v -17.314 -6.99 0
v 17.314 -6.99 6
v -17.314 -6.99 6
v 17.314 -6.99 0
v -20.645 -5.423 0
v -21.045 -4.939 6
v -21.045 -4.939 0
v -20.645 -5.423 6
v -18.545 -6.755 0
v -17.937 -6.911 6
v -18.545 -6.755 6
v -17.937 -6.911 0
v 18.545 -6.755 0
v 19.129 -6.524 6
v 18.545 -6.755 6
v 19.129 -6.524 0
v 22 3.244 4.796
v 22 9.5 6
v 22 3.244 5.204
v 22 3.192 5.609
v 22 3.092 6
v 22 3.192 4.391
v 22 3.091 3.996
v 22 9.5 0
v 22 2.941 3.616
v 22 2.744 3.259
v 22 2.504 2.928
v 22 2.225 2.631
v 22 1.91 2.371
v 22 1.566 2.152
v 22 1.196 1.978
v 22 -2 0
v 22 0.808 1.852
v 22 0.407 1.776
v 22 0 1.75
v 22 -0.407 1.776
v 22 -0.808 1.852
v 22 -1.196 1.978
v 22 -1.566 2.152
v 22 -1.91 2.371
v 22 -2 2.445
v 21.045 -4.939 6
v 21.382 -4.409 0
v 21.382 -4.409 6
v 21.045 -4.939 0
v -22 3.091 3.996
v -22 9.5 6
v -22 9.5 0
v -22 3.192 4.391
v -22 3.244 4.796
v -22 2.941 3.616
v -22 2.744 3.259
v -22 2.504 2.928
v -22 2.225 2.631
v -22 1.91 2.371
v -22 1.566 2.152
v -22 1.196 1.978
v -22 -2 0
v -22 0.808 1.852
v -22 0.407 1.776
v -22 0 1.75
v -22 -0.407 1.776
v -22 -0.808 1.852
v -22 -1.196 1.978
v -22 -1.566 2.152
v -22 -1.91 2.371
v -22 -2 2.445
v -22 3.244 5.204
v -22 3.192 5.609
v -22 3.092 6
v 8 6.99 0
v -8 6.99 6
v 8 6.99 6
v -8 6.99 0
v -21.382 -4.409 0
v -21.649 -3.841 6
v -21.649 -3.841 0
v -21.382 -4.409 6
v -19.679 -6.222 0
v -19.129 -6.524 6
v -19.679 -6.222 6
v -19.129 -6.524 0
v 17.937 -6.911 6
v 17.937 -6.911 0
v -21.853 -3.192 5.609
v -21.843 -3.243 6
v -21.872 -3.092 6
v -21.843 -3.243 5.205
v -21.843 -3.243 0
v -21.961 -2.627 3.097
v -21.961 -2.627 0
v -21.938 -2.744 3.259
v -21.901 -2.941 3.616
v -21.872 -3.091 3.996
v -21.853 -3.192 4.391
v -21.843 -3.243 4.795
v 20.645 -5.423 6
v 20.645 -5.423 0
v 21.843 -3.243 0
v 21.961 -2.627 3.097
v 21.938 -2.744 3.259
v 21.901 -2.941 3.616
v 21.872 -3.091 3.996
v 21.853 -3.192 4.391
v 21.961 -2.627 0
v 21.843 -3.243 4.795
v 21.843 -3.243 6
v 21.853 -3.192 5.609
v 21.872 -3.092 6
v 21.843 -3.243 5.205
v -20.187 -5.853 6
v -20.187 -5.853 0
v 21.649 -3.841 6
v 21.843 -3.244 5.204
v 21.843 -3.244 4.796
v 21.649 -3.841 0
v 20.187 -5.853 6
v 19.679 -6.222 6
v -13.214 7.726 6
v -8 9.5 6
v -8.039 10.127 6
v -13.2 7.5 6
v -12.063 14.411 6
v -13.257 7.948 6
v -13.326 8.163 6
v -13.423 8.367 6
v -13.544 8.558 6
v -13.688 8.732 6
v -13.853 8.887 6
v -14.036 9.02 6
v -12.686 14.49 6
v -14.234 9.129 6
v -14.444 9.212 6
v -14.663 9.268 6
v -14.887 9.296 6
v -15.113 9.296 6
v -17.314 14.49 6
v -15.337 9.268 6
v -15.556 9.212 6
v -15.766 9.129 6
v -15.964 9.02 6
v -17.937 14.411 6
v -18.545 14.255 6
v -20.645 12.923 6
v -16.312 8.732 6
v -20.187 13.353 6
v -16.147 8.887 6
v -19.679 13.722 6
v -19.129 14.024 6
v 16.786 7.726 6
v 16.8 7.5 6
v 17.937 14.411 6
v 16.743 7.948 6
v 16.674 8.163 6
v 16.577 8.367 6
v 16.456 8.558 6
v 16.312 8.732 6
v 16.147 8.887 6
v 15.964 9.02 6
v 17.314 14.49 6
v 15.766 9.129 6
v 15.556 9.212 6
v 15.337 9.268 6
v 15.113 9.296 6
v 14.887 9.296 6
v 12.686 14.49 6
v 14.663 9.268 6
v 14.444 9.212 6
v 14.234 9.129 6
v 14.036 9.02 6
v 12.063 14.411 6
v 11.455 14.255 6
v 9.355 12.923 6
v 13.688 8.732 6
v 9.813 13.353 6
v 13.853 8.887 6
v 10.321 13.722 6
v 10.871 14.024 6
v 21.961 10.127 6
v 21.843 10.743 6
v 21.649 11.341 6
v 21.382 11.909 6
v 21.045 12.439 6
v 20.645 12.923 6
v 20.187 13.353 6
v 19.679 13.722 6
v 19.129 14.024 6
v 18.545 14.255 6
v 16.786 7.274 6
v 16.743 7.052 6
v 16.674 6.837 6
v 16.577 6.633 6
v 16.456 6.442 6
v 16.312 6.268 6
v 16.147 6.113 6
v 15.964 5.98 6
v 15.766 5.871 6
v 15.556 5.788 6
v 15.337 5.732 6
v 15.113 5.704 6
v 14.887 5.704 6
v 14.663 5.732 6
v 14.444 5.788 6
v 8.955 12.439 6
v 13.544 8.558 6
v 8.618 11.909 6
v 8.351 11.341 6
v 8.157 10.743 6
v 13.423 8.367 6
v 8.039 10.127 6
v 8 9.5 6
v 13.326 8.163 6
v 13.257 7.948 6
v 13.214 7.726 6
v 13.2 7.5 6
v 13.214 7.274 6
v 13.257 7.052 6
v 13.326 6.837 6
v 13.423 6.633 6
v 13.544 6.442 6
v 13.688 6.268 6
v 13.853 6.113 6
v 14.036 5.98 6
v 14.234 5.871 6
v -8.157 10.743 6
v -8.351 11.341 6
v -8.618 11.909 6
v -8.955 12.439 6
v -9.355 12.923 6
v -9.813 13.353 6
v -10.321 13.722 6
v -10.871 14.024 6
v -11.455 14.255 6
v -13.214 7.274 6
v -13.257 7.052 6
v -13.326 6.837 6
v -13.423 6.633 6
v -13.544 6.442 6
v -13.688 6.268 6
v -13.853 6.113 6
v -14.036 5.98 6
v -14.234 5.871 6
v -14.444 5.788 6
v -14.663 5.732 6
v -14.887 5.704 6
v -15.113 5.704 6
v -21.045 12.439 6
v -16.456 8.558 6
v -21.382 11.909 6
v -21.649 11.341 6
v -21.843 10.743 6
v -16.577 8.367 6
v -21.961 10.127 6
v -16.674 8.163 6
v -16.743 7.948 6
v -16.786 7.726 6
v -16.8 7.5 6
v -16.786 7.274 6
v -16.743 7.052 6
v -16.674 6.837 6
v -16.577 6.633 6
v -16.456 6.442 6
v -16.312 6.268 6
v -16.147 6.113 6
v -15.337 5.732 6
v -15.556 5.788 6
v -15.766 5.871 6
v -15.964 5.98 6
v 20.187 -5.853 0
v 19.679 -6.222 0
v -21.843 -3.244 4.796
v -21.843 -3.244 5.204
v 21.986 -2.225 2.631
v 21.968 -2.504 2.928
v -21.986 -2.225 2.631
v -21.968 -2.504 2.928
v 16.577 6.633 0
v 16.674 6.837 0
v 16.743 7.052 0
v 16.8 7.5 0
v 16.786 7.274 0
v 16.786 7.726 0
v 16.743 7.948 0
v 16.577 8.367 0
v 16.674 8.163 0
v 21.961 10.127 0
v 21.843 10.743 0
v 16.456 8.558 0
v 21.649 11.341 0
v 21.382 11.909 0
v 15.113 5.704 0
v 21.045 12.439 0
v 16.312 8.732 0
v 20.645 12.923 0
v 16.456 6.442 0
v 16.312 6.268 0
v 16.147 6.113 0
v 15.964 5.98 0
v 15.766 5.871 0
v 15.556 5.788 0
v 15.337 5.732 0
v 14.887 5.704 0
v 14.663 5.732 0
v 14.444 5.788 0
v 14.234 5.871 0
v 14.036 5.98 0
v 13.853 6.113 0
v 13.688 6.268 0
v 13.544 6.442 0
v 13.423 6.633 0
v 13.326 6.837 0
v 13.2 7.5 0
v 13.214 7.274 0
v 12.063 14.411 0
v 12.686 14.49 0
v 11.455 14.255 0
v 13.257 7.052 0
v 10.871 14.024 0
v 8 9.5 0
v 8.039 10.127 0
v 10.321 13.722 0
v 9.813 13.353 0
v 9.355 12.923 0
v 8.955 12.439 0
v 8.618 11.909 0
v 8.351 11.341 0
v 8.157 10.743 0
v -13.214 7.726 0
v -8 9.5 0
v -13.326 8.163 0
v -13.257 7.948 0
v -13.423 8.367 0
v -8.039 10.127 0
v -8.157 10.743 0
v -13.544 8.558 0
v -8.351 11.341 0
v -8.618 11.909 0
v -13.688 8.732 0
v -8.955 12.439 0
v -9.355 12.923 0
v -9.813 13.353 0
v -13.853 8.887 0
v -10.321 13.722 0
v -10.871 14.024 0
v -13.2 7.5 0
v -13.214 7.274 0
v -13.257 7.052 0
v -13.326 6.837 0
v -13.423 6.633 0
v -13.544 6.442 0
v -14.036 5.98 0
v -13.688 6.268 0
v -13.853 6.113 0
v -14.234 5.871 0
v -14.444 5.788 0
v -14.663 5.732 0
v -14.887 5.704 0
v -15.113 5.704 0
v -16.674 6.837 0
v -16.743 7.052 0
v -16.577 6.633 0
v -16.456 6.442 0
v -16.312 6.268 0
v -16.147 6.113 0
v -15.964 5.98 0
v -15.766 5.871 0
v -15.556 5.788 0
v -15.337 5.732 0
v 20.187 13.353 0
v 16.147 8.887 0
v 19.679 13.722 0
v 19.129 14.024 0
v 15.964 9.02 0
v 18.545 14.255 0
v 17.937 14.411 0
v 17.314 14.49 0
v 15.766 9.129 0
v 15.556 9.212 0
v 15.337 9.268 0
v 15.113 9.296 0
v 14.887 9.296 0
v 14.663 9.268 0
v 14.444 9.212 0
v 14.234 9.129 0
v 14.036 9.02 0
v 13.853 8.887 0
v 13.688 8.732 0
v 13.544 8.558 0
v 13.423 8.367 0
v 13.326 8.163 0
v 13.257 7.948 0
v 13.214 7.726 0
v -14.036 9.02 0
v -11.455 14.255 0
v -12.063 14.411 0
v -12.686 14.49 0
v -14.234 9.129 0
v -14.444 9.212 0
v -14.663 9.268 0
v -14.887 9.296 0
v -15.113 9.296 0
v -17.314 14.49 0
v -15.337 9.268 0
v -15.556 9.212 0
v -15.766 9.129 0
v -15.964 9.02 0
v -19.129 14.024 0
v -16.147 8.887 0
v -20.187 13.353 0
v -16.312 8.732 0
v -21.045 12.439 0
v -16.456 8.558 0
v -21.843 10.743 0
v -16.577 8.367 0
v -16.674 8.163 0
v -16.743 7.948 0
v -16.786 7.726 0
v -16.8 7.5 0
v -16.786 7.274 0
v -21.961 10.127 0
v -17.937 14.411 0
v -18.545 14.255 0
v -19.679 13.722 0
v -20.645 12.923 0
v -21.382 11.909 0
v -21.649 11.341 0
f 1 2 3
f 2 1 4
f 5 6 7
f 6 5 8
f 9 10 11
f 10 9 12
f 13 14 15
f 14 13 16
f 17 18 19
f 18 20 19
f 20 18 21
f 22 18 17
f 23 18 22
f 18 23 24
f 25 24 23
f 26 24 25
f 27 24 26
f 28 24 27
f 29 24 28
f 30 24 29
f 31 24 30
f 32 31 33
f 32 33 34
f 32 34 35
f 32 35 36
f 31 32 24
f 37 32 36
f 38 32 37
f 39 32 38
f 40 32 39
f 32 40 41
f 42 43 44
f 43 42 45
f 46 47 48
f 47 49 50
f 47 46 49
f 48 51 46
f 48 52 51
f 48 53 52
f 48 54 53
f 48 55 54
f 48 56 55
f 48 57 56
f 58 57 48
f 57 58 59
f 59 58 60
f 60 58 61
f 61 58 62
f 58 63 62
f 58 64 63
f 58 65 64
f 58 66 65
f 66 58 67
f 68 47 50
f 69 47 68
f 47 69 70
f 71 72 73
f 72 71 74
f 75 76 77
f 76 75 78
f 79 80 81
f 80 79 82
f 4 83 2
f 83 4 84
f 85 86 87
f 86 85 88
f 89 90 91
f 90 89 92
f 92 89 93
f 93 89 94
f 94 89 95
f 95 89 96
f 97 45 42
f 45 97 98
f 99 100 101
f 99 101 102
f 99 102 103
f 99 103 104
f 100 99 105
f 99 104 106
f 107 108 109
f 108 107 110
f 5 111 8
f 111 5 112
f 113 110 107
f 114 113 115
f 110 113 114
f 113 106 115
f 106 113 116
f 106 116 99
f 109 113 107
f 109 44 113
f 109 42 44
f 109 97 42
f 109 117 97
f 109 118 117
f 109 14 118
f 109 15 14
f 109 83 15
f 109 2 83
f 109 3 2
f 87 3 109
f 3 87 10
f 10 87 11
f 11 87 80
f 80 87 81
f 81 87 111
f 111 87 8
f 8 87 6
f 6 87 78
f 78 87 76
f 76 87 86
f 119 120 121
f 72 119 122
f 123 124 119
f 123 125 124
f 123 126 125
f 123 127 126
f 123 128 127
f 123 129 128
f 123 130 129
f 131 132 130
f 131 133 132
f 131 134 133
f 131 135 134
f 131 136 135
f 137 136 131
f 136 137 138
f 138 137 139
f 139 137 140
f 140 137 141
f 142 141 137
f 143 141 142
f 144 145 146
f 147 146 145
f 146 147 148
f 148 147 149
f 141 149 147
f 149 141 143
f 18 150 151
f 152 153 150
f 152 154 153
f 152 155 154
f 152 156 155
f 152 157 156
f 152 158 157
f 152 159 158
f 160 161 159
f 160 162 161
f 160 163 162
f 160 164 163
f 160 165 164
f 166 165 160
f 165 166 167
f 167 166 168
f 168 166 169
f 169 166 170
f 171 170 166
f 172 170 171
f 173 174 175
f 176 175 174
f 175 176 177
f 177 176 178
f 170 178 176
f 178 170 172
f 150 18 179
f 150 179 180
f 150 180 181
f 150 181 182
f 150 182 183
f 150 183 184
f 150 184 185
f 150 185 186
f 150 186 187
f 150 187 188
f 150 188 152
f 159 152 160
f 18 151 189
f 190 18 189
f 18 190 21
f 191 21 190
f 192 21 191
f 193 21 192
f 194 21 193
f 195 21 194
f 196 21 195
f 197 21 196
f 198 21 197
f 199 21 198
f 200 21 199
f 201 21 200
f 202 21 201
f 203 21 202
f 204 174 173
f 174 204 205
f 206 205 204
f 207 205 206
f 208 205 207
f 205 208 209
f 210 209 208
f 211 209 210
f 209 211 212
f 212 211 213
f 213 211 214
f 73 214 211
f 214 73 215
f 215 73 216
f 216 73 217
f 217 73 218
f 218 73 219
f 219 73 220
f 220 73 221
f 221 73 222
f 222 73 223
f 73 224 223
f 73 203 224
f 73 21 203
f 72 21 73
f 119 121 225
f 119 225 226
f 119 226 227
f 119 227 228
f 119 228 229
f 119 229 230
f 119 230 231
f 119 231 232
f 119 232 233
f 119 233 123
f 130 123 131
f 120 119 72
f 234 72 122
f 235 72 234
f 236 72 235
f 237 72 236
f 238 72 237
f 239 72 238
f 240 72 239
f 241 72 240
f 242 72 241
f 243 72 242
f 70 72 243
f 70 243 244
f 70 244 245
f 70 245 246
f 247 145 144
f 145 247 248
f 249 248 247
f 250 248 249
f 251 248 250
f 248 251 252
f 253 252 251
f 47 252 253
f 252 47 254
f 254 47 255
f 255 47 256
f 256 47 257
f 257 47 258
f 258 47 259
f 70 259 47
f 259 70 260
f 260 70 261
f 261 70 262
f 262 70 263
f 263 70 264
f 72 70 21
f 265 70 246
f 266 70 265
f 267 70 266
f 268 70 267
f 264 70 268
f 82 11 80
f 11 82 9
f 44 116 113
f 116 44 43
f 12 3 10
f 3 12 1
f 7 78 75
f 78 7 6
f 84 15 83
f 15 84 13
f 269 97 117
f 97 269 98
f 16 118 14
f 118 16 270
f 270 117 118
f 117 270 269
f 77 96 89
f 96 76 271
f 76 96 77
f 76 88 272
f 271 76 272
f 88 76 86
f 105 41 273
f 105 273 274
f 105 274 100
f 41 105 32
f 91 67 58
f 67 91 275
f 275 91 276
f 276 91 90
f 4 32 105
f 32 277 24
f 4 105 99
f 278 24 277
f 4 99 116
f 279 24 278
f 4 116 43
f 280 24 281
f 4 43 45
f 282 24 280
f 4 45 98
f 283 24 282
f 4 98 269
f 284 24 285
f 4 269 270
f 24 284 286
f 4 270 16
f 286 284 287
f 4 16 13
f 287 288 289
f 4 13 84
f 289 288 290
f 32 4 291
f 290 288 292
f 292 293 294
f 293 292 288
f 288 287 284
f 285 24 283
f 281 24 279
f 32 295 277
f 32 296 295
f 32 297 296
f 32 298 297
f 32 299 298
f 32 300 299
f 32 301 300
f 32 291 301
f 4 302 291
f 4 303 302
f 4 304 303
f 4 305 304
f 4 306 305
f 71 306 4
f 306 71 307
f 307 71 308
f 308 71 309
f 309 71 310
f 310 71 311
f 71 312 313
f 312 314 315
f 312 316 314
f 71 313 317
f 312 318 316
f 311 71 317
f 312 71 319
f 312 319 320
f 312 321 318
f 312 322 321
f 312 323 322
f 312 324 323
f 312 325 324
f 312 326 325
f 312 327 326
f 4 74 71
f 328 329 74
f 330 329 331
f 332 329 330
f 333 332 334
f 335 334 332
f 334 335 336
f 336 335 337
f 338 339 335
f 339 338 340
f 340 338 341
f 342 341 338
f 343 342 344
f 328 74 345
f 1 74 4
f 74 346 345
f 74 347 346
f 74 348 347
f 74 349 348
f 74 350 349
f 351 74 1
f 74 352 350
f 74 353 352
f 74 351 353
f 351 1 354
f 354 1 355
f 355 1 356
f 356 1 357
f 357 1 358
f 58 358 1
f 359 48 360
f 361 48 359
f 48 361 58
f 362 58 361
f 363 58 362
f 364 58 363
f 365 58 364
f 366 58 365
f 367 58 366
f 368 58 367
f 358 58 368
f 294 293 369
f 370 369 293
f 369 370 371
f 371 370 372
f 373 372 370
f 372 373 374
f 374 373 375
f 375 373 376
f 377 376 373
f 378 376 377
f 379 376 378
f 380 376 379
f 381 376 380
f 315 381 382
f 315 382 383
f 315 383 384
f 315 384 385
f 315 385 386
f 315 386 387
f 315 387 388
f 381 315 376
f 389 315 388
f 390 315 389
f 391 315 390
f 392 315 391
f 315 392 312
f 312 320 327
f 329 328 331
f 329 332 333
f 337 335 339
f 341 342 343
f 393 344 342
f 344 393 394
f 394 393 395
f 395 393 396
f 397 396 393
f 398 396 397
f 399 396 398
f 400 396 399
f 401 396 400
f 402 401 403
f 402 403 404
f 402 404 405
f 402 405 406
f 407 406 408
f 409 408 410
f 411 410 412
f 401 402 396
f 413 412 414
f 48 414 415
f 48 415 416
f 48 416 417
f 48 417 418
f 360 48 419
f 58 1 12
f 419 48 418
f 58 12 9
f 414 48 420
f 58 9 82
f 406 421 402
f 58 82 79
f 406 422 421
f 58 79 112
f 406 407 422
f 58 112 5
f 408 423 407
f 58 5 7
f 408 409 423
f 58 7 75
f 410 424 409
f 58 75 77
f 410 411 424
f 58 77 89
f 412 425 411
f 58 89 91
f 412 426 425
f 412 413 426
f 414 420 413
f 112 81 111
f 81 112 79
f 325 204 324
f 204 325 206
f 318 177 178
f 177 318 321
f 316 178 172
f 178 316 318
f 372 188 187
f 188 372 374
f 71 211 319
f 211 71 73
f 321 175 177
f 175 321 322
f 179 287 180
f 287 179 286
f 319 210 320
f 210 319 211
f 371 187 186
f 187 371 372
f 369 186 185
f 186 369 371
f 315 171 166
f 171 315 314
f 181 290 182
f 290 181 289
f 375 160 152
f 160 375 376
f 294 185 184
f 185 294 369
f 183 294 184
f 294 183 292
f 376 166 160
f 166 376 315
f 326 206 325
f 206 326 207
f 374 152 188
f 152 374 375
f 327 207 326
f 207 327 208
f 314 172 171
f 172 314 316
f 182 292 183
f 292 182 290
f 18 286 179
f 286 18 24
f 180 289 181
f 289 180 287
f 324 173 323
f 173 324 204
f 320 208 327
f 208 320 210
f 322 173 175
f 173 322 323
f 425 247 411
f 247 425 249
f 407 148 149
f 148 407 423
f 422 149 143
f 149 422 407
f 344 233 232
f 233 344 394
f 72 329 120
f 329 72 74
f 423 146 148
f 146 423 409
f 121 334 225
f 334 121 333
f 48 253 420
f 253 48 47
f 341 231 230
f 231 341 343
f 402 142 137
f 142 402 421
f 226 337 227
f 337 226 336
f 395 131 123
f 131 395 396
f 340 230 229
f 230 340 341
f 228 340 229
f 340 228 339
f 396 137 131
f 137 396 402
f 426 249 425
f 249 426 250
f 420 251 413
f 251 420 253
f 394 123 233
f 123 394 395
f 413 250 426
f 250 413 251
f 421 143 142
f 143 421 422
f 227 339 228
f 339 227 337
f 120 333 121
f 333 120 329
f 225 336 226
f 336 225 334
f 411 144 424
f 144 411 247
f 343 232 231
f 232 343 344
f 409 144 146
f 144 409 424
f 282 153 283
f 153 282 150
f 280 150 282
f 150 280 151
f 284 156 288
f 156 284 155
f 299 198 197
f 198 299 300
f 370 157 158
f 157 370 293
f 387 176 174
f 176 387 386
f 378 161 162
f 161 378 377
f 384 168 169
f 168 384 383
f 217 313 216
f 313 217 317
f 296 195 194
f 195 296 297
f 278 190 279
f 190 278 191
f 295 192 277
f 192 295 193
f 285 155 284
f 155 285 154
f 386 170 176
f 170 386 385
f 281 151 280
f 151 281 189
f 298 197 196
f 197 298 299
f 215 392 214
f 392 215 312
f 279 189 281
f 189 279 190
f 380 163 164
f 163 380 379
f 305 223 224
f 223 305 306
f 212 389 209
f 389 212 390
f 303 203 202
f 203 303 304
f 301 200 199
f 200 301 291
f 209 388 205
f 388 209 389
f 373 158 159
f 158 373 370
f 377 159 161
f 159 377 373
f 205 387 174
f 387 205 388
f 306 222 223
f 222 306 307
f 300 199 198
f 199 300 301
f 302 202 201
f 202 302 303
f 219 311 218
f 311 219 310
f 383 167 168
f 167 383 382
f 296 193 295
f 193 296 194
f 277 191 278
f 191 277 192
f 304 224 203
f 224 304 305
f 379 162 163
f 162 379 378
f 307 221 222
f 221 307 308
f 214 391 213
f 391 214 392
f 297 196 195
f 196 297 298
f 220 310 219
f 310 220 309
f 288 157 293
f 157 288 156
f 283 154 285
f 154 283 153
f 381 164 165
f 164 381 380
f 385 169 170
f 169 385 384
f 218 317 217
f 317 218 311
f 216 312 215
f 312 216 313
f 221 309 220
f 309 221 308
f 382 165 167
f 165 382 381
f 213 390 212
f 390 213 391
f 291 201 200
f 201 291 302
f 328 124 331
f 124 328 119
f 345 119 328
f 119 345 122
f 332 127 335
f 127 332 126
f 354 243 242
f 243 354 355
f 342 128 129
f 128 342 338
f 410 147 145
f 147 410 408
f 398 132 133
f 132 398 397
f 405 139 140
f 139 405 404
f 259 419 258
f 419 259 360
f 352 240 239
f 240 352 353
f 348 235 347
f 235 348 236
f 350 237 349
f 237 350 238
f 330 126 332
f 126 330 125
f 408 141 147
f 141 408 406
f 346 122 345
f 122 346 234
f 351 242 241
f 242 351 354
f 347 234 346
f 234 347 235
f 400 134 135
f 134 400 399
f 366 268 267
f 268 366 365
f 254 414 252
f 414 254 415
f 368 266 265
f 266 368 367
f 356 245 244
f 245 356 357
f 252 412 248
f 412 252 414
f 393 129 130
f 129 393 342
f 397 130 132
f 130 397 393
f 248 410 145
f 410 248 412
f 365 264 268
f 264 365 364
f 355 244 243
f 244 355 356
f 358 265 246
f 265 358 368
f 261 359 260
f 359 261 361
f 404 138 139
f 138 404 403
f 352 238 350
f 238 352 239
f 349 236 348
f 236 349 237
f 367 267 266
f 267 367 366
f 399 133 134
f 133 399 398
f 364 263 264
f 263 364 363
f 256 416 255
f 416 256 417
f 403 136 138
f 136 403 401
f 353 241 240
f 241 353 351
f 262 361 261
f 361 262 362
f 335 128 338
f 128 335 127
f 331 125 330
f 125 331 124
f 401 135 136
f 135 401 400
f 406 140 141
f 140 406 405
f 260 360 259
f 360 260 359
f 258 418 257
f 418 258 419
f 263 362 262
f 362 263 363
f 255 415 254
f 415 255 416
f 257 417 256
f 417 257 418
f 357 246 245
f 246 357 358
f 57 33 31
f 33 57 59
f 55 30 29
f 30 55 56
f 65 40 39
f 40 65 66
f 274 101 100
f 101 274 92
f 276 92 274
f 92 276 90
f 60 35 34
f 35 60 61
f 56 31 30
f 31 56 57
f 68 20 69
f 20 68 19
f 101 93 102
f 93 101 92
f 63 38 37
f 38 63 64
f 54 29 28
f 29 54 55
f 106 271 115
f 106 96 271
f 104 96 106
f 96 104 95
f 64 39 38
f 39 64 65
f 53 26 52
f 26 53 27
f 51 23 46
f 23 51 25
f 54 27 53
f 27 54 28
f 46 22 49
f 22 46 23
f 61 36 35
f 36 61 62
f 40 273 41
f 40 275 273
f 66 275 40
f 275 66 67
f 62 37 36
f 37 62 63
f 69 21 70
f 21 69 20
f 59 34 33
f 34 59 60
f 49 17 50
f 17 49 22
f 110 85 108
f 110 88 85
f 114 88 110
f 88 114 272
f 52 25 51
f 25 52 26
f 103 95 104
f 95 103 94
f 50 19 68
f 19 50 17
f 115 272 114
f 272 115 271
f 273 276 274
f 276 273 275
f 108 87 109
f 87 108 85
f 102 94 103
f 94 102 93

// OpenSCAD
$fn = 50;


difference() {
	union() {
		hull() {
			translate(v = [-17.0000000000, 2.0000000000, 0]) {
				cylinder(h = 6, r = 5);
			}
			translate(v = [17.0000000000, 2.0000000000, 0]) {
				cylinder(h = 6, r = 5);
			}
			translate(v = [-17.0000000000, -2.0000000000, 0]) {
				cylinder(h = 6, r = 5);
			}
			translate(v = [17.0000000000, -2.0000000000, 0]) {
				cylinder(h = 6, r = 5);
			}
		}
		translate(v = [15.0000000000, 3.7500000000, 0]) {
			hull() {
				translate(v = [-2.0000000000, 5.7500000000, 0]) {
					cylinder(h = 6, r = 5);
				}
				translate(v = [2.0000000000, 5.7500000000, 0]) {
					cylinder(h = 6, r = 5);
				}
				translate(v = [-2.0000000000, -5.7500000000, 0]) {
					cylinder(h = 6, r = 5);
				}
				translate(v = [2.0000000000, -5.7500000000, 0]) {
					cylinder(h = 6, r = 5);
				}
			}
		}
		translate(v = [-15.0000000000, 3.7500000000, 0]) {
			hull() {
				translate(v = [-2.0000000000, 5.7500000000, 0]) {
					cylinder(h = 6, r = 5);
				}
				translate(v = [2.0000000000, 5.7500000000, 0]) {
					cylinder(h = 6, r = 5);
				}
				translate(v = [-2.0000000000, -5.7500000000, 0]) {
					cylinder(h = 6, r = 5);
				}
				translate(v = [2.0000000000, -5.7500000000, 0]) {
					cylinder(h = 6, r = 5);
				}
			}
		}
	}
	union() {
		#translate(v = [15.0000000000, 7.5000000000, 0]) {
			cylinder(h = 6, r = 1.8000000000);
		}
		#translate(v = [-15.0000000000, 7.5000000000, 0]) {
			cylinder(h = 6, r = 1.8000000000);
		}
		translate(v = [-22.5000000000, 0, 5.0000000000]) {
			rotate(a = [0, 90, 0]) {
				cylinder(h = 45, r = 3.2500000000);
			}
		}
	}
}
